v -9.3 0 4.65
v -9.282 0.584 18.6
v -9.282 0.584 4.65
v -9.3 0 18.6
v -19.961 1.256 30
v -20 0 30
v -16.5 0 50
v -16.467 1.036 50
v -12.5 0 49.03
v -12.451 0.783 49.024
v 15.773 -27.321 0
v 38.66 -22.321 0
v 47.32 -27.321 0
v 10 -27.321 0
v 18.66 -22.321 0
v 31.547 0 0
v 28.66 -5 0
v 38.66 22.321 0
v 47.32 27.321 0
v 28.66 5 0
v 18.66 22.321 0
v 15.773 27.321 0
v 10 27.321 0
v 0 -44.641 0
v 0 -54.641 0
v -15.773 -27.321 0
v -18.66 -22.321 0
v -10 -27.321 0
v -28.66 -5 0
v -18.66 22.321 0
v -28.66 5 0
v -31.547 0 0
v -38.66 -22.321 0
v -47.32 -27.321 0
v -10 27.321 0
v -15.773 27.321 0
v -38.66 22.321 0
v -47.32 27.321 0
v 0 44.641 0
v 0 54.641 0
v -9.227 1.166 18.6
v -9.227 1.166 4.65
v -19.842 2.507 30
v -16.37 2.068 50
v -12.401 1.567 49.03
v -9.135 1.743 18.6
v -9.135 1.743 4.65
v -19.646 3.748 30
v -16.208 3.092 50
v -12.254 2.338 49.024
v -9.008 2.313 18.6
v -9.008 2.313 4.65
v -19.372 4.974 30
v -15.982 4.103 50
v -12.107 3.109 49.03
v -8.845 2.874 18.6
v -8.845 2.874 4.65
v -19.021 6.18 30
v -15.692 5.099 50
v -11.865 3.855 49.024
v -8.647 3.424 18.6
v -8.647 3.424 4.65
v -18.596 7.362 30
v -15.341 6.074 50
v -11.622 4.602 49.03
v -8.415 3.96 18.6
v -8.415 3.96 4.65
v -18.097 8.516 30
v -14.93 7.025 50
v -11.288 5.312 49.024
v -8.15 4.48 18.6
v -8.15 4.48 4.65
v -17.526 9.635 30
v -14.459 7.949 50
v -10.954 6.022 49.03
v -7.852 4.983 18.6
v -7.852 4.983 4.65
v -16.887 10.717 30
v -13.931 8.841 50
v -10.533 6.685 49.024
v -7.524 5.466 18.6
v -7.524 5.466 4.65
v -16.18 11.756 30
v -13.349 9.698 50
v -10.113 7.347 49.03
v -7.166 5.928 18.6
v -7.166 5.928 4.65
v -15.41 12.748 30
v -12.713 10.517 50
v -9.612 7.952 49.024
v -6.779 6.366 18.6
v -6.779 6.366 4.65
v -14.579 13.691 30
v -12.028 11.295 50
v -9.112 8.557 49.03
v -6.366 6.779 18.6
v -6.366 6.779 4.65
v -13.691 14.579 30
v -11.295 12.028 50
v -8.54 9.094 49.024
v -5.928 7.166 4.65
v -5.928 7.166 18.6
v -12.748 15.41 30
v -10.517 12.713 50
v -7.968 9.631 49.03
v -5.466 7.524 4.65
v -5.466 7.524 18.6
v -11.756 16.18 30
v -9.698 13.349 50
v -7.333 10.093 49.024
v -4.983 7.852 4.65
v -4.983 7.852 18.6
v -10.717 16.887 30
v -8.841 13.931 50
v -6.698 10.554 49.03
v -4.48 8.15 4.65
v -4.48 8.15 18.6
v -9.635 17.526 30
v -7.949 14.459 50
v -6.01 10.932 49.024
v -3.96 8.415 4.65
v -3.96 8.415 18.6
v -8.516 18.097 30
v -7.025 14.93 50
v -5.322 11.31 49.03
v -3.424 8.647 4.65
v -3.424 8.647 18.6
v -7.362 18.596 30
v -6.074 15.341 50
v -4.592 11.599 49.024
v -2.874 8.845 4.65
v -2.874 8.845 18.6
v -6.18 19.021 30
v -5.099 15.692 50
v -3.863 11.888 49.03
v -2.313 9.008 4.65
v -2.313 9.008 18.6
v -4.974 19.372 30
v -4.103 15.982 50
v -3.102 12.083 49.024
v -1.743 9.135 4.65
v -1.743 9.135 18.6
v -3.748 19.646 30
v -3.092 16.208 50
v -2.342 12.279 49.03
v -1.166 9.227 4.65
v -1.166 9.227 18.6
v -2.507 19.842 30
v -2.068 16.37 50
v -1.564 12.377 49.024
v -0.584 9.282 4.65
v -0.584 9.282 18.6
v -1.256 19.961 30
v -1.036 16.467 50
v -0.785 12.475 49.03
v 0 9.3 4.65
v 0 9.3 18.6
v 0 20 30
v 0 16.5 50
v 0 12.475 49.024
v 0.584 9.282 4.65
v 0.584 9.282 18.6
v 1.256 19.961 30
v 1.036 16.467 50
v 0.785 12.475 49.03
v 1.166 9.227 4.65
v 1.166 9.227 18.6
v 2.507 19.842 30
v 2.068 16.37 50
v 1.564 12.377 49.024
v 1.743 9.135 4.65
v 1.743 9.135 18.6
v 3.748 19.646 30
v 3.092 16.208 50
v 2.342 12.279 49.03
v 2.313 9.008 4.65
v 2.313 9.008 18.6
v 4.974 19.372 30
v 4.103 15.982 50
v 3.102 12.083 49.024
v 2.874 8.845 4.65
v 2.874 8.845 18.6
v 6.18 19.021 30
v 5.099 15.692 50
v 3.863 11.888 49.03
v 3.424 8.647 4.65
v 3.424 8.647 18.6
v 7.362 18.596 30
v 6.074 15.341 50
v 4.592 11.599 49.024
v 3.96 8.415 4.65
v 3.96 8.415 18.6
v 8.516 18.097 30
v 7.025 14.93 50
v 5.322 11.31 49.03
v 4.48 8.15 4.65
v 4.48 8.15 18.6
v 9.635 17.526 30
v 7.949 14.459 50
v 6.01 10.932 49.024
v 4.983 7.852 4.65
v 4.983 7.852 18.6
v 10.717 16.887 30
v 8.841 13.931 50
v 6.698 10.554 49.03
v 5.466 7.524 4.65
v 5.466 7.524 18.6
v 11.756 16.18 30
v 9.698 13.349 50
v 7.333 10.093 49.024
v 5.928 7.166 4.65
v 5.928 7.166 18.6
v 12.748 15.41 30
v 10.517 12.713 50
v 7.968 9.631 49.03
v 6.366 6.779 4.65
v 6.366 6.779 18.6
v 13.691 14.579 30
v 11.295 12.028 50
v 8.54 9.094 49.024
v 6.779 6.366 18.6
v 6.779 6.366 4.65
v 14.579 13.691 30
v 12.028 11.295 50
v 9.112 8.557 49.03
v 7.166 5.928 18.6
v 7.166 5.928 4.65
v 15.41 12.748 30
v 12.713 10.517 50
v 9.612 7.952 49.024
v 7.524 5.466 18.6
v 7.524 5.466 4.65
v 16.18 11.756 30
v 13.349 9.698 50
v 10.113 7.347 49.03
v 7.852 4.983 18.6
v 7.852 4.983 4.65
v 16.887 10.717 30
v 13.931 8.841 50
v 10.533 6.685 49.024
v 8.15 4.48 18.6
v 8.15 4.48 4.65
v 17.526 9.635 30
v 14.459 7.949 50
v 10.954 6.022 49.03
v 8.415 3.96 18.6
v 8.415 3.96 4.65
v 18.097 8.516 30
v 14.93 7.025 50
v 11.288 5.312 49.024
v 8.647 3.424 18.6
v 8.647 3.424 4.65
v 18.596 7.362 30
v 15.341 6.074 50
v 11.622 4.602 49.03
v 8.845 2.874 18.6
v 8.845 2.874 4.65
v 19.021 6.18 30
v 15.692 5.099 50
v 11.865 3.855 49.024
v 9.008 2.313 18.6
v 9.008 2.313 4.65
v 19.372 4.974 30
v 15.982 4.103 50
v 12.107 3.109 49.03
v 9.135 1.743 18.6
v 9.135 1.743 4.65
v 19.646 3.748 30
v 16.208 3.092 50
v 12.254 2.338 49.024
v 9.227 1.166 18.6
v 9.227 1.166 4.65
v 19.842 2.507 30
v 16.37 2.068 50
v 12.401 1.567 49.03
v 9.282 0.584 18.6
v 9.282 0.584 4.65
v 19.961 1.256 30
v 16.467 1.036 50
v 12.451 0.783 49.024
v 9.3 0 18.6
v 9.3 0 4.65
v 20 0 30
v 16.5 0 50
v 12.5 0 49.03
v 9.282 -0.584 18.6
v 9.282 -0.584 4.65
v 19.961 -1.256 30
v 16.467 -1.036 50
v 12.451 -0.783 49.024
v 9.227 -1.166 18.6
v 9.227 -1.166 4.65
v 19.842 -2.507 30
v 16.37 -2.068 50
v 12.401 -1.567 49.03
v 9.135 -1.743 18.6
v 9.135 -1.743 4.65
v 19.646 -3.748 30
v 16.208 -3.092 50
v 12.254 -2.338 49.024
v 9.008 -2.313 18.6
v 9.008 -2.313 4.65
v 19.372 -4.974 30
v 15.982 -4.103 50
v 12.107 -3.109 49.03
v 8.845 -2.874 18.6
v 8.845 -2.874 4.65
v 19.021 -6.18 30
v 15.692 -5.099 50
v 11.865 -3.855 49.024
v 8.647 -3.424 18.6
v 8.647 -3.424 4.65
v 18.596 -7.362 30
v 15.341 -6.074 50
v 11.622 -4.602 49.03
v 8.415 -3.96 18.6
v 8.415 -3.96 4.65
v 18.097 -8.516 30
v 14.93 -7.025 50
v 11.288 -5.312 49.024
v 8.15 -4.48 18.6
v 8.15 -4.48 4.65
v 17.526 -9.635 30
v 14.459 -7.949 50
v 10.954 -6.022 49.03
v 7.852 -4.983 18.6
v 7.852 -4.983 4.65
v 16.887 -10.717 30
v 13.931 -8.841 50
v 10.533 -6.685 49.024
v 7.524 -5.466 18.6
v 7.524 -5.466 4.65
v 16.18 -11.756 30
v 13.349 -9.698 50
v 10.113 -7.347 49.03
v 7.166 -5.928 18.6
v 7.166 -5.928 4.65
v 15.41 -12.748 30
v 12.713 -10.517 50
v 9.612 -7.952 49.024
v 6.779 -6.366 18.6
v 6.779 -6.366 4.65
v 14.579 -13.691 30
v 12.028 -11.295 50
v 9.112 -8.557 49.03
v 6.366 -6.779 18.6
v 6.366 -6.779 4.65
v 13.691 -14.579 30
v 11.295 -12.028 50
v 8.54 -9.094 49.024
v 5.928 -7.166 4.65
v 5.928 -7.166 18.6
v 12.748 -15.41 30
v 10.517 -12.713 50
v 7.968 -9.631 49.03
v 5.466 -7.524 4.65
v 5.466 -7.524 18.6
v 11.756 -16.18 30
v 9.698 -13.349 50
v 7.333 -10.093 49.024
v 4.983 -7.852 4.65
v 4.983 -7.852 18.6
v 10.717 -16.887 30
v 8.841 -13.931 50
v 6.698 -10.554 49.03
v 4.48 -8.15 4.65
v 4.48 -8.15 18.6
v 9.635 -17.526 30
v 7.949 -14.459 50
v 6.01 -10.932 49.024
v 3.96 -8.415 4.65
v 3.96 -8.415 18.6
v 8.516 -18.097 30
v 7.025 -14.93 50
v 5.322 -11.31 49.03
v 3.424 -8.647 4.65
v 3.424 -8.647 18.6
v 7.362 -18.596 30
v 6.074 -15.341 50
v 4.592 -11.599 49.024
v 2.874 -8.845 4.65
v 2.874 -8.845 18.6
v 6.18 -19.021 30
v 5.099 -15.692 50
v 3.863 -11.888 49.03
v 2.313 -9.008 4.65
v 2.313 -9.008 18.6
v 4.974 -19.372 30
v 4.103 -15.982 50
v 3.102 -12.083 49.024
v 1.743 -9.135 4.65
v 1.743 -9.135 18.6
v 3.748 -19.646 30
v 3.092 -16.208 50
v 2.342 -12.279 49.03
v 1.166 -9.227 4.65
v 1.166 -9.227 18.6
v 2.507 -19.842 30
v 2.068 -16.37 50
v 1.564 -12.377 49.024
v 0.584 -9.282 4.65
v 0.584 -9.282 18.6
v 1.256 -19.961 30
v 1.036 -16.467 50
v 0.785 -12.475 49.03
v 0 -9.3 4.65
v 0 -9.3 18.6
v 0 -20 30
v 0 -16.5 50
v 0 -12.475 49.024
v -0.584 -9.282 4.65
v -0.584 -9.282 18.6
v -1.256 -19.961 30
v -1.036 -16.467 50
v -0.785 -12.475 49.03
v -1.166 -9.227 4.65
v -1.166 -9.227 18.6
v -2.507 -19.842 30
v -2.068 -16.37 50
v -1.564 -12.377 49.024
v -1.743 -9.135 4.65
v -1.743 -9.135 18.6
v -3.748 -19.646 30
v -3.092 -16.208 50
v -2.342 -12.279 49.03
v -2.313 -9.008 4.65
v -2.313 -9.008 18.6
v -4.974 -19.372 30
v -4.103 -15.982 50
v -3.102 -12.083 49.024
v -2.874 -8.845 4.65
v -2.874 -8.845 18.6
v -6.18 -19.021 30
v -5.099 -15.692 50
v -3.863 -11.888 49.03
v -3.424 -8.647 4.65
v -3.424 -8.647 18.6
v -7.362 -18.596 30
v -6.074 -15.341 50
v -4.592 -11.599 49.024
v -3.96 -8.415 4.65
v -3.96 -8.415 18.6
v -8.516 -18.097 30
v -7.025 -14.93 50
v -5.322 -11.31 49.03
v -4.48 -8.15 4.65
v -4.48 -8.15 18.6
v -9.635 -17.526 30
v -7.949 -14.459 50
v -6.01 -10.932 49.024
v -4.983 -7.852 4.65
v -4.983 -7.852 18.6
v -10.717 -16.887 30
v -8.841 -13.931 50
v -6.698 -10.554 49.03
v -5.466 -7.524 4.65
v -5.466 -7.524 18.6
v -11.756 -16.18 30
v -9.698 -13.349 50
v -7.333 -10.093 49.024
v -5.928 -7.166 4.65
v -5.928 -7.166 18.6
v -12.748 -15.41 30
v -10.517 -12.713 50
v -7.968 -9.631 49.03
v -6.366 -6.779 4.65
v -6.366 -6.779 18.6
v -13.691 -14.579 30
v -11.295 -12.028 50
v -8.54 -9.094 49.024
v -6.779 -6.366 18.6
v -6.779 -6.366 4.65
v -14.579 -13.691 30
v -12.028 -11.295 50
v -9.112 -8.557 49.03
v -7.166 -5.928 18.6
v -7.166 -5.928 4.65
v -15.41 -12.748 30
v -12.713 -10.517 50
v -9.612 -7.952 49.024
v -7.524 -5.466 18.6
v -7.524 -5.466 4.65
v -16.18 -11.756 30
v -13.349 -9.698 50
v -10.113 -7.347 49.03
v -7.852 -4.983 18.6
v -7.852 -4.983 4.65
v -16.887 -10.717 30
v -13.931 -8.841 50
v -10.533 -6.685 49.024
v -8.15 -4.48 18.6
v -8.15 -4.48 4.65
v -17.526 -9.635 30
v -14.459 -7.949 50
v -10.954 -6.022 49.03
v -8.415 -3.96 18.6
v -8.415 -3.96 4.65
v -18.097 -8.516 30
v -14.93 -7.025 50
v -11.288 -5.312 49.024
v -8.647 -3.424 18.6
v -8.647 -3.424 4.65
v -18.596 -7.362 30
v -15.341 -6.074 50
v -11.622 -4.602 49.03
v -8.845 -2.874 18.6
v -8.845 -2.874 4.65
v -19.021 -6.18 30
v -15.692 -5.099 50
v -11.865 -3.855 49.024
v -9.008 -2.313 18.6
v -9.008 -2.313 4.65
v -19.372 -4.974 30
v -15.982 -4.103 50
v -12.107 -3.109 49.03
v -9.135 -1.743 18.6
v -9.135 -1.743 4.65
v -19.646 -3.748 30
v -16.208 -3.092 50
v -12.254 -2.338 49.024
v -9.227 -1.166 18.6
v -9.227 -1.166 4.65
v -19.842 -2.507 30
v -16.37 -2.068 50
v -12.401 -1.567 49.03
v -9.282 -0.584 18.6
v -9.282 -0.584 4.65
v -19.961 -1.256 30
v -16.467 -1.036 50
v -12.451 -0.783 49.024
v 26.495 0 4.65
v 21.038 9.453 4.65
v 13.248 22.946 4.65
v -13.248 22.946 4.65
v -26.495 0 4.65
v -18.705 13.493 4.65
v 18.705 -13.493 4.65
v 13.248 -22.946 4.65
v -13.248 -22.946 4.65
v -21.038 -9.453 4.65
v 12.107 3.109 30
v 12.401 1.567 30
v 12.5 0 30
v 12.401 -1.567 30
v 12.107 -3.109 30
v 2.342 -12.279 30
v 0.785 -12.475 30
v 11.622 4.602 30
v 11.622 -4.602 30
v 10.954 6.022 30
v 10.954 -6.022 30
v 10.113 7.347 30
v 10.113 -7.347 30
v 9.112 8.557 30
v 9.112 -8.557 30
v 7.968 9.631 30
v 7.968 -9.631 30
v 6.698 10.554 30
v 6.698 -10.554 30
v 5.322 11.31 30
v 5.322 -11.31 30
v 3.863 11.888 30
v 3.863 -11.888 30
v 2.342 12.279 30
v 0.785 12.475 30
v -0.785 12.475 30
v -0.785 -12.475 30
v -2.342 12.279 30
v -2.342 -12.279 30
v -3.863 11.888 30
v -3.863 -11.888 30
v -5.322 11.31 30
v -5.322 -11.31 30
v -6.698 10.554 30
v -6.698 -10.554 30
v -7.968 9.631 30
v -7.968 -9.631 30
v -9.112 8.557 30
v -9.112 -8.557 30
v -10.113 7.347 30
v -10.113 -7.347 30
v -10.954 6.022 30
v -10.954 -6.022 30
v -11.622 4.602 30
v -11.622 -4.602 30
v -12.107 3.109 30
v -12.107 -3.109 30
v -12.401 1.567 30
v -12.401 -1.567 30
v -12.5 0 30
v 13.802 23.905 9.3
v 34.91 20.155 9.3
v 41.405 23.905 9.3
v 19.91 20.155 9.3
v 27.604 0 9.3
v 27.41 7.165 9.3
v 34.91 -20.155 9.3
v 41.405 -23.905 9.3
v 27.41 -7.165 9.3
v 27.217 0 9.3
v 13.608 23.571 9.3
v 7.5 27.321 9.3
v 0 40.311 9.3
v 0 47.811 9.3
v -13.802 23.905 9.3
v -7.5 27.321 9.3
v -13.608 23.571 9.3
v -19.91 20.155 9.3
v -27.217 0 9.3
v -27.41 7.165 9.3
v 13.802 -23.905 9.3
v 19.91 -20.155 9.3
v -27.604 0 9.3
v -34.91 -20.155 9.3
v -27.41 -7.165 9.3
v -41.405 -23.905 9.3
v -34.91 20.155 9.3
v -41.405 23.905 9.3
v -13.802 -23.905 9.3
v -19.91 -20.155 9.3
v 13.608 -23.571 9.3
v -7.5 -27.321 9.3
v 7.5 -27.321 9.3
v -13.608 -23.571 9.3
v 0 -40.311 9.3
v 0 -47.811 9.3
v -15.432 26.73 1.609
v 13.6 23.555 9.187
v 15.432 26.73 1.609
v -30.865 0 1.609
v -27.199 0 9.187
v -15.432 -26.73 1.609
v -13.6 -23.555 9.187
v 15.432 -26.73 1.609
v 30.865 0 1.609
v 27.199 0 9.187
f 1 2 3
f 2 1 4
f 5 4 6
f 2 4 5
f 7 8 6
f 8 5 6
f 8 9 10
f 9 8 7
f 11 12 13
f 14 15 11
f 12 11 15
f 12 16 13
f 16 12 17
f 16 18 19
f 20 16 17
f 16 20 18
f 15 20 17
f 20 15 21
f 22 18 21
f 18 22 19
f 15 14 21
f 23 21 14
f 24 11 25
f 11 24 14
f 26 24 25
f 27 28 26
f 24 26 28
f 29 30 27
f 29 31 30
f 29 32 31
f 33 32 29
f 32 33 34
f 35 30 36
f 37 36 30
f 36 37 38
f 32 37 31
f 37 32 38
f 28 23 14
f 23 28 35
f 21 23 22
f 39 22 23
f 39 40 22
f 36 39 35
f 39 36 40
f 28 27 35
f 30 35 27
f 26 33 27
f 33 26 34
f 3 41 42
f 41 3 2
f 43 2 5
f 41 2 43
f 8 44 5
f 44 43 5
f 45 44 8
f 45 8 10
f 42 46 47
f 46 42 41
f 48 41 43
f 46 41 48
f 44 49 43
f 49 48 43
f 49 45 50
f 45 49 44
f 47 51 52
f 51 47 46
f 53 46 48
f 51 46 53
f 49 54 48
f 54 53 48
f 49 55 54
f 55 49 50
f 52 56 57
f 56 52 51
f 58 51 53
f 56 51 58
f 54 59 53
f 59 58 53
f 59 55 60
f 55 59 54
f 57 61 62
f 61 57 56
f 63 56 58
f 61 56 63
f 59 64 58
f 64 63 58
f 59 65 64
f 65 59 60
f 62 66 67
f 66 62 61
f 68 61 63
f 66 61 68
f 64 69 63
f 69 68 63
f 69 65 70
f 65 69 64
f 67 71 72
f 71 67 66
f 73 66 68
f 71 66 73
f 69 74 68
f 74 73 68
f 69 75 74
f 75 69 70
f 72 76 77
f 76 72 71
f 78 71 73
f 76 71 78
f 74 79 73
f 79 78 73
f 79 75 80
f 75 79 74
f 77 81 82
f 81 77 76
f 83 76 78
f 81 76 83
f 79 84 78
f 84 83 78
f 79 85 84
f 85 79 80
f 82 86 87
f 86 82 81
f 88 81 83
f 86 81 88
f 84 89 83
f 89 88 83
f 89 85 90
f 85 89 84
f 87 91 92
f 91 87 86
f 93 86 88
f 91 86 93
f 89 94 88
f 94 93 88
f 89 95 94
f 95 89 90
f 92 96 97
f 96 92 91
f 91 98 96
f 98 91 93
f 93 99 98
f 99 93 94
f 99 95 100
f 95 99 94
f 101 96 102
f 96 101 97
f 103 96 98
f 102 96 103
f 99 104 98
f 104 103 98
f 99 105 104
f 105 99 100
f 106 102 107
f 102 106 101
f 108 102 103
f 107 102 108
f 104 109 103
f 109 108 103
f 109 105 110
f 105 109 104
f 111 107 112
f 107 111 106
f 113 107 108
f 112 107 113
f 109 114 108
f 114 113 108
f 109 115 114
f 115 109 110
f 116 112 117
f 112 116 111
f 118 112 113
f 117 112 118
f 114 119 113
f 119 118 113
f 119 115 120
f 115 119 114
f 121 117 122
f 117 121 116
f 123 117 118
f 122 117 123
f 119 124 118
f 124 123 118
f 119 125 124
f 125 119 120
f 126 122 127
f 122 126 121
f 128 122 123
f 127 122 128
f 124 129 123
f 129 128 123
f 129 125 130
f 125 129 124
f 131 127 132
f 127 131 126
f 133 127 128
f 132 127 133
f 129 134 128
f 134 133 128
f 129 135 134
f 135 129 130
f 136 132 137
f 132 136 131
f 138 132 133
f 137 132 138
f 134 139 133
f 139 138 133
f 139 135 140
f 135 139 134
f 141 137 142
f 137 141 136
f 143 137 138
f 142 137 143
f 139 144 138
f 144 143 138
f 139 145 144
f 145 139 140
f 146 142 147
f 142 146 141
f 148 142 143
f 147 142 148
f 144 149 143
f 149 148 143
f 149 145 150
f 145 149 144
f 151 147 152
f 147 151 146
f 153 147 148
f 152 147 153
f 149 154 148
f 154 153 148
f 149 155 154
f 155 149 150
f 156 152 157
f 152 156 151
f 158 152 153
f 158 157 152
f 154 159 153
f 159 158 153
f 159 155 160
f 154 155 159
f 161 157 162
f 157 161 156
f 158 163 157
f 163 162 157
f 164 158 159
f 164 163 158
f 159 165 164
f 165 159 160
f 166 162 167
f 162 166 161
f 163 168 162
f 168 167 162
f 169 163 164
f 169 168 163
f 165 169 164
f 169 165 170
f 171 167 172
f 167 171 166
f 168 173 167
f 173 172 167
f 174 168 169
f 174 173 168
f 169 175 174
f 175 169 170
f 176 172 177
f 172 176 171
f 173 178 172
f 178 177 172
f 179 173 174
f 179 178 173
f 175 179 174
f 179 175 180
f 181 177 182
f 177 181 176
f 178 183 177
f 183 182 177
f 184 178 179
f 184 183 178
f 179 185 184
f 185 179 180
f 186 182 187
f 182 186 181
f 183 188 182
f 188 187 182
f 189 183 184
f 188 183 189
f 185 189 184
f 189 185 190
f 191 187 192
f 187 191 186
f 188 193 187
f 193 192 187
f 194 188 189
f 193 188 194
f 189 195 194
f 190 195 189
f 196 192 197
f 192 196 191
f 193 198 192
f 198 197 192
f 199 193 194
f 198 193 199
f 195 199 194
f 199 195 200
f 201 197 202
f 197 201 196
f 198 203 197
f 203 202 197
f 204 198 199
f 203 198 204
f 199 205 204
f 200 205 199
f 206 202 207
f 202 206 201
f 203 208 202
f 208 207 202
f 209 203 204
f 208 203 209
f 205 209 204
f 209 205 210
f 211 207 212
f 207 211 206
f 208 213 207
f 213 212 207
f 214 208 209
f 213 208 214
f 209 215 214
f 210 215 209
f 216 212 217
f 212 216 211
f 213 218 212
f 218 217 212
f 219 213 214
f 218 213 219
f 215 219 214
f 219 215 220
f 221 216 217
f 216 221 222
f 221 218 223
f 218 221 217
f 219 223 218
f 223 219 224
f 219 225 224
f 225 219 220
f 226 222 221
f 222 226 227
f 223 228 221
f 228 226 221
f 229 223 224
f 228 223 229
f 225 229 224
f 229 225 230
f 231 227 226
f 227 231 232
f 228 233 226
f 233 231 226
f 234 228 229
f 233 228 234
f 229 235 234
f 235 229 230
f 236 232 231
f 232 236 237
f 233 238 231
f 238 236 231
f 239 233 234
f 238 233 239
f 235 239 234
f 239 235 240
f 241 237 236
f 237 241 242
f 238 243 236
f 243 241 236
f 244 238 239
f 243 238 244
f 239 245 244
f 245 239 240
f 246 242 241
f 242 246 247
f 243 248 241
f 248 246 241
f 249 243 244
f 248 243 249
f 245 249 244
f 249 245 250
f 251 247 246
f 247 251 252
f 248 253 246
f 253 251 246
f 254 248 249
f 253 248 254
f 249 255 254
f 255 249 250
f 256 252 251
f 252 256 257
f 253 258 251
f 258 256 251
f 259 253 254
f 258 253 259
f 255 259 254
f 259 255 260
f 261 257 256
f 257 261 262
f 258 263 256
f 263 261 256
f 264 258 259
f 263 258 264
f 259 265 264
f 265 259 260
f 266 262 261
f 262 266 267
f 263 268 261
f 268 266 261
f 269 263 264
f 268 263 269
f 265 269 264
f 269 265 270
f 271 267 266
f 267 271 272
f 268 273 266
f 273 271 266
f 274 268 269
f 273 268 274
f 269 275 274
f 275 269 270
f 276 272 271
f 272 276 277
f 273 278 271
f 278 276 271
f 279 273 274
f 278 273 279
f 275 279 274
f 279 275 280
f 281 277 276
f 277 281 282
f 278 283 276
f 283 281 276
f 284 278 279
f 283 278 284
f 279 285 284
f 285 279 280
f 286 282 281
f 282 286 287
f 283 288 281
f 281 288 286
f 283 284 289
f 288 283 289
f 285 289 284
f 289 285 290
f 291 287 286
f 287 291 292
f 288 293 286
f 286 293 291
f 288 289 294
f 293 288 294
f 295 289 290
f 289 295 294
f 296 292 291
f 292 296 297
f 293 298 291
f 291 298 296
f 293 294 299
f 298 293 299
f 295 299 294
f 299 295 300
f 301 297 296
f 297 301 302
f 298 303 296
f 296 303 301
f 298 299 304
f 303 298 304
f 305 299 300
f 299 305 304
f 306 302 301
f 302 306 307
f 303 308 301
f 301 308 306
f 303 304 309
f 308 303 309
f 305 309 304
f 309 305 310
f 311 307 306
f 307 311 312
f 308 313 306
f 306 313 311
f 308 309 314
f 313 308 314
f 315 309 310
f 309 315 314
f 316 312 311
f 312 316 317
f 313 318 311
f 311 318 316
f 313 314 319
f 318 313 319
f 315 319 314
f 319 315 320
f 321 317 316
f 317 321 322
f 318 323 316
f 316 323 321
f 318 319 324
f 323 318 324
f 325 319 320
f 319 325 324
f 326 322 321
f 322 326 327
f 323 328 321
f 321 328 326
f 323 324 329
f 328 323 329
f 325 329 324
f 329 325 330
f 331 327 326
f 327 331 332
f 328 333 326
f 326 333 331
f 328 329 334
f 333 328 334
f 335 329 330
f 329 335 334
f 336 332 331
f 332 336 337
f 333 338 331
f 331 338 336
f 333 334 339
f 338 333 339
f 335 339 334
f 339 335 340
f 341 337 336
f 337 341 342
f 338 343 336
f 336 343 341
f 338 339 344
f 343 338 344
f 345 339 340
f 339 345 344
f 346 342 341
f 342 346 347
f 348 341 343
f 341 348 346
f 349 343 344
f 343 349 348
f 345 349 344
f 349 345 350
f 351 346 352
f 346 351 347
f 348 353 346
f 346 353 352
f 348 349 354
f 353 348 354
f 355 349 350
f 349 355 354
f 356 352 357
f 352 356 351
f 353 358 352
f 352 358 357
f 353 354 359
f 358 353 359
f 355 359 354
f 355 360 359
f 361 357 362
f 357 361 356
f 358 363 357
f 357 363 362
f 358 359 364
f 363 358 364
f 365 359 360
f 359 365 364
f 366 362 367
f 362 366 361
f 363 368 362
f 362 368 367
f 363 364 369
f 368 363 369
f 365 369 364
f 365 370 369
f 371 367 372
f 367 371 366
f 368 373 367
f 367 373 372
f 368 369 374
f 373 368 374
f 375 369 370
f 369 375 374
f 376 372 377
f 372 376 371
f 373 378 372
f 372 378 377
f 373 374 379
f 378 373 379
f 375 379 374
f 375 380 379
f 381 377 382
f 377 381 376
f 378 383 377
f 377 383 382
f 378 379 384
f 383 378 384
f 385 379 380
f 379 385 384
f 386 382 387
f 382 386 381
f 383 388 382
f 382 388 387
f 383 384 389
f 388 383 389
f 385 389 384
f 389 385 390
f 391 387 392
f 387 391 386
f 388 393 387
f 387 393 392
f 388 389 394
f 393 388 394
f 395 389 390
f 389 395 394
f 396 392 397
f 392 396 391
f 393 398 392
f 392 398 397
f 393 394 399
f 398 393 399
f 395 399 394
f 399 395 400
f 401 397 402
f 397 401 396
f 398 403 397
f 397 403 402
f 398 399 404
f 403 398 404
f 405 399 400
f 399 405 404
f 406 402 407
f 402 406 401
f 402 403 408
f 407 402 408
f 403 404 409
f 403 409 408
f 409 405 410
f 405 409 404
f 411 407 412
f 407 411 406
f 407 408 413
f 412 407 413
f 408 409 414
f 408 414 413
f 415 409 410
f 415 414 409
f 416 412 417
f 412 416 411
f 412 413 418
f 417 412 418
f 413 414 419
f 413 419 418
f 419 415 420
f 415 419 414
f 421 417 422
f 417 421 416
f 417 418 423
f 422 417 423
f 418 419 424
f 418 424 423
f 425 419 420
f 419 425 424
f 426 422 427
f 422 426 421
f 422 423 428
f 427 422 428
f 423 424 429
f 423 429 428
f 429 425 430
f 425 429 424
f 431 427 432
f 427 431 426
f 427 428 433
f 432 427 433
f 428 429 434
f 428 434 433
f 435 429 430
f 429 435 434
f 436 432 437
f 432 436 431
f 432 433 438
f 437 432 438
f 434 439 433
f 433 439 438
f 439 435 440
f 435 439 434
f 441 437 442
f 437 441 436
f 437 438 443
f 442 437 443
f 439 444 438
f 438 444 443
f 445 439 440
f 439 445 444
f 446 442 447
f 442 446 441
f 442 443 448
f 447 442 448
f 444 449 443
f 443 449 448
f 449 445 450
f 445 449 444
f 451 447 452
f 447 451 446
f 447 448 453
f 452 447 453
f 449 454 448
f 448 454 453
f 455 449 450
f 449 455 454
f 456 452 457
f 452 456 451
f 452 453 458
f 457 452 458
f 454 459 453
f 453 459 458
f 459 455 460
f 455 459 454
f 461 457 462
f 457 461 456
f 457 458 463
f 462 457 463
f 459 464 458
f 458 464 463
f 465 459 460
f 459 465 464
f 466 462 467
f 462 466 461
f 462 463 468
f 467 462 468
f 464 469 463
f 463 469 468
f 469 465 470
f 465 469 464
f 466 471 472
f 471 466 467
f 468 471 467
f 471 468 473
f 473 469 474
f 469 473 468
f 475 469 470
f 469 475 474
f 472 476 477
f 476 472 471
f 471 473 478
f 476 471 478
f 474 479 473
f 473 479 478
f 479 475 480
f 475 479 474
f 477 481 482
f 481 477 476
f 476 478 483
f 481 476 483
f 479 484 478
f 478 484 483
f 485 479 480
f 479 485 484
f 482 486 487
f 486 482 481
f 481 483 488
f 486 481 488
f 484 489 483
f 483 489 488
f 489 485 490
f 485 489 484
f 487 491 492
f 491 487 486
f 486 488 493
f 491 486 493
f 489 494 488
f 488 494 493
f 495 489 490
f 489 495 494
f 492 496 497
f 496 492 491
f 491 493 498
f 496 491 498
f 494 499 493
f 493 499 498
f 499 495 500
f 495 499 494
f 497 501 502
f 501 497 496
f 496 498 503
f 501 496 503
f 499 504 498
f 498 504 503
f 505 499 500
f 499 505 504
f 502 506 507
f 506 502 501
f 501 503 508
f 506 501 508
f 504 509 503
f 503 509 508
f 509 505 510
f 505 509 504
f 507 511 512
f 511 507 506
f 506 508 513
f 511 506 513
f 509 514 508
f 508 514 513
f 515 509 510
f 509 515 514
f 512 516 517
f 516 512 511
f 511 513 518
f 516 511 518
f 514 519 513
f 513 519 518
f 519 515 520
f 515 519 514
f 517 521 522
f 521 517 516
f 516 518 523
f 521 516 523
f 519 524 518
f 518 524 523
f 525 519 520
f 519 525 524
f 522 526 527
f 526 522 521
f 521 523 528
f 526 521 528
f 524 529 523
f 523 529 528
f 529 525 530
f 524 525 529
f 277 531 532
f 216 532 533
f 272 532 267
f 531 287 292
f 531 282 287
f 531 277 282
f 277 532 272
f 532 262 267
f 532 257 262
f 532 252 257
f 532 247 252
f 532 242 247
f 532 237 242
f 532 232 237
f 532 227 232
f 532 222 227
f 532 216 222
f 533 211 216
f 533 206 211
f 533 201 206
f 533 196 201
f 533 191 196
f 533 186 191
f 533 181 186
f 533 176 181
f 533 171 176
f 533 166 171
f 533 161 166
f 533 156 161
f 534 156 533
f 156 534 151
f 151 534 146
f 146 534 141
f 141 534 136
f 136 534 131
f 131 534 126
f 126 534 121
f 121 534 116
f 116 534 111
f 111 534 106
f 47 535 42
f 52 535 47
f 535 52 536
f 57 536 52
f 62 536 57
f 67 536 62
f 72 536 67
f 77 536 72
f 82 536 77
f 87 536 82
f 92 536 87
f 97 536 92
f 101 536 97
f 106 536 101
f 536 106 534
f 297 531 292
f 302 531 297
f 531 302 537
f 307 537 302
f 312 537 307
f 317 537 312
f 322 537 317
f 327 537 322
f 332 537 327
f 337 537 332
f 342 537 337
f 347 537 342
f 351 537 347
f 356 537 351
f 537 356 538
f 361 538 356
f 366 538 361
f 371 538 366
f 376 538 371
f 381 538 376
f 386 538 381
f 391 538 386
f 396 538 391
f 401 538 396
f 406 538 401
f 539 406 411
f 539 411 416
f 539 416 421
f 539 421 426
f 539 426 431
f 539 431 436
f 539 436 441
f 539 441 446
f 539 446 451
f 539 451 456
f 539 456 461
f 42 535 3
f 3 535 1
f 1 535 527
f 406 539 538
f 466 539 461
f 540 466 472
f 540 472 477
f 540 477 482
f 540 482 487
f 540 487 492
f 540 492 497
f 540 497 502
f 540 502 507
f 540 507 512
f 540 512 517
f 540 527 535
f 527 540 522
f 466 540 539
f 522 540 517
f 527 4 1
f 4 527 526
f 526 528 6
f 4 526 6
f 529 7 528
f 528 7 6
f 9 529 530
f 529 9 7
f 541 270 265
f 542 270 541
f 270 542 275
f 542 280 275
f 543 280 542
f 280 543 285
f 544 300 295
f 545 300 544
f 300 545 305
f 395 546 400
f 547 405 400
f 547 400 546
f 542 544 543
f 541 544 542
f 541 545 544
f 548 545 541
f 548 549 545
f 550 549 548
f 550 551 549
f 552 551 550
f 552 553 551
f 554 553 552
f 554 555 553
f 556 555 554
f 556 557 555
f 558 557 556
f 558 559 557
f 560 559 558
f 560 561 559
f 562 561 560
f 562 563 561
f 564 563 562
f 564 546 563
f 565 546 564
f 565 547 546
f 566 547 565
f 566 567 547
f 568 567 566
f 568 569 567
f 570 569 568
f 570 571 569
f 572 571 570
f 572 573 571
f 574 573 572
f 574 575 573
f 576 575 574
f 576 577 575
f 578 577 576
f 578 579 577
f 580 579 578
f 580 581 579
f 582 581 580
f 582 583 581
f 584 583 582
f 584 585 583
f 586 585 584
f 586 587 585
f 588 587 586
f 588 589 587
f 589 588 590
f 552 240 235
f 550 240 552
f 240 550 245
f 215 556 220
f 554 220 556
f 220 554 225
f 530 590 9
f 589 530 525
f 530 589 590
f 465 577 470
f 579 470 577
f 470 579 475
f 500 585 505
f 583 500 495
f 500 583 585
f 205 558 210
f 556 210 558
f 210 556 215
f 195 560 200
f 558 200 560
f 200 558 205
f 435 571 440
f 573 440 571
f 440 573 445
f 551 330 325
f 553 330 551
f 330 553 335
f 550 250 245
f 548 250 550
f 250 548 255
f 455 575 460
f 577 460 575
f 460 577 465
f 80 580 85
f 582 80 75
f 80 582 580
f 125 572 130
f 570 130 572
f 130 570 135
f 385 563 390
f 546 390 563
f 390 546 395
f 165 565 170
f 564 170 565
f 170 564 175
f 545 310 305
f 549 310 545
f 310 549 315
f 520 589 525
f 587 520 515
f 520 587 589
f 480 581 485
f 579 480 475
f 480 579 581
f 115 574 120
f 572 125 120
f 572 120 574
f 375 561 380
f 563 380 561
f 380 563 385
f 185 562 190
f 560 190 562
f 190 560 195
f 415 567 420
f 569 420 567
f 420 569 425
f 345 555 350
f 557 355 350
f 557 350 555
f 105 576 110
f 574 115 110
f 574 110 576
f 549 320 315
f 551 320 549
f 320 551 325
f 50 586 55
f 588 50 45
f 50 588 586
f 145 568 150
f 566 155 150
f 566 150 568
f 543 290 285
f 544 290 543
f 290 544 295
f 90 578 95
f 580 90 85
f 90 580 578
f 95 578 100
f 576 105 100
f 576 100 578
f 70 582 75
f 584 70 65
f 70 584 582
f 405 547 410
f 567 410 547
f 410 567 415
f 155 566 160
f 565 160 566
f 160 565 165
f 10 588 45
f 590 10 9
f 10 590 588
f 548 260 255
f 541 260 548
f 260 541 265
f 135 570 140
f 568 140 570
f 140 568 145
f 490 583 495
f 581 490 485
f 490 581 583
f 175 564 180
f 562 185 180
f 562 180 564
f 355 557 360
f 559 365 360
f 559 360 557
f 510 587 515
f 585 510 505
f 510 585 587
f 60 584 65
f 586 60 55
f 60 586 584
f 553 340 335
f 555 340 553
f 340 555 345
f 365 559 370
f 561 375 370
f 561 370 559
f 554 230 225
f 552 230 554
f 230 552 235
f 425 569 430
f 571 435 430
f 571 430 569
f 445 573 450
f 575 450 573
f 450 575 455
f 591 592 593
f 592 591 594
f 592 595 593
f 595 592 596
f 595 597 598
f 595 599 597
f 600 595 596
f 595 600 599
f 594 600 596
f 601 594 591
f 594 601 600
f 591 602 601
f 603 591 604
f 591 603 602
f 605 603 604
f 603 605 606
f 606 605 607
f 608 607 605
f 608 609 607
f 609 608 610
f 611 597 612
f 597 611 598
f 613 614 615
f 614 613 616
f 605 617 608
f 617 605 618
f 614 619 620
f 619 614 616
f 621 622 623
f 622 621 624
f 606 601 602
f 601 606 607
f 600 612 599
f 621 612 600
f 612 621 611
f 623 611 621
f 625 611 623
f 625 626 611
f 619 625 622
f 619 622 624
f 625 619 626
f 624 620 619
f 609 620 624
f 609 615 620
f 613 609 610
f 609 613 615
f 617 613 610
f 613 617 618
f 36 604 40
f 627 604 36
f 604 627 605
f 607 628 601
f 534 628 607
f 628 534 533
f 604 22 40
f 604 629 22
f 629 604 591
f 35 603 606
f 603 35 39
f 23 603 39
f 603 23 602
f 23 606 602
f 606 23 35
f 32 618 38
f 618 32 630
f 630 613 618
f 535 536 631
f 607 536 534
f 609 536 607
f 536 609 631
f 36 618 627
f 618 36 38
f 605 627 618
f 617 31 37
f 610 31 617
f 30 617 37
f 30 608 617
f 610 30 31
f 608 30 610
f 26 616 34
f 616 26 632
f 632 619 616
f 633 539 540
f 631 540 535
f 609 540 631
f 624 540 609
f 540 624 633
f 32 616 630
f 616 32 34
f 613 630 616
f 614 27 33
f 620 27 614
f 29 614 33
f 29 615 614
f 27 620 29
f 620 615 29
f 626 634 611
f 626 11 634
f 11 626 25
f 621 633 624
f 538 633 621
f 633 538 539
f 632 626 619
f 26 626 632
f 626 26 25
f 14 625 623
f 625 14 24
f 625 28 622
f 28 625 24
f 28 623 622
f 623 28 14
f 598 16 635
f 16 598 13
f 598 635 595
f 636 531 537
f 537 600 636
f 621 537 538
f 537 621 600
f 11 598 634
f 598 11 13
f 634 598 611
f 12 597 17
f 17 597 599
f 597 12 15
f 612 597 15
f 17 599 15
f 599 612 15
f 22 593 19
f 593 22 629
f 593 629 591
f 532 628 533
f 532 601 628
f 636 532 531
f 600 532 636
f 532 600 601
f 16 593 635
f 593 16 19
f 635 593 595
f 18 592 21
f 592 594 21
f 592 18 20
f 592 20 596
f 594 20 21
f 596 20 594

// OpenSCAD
/*          
            Shabbat Candle Holder
            Steve Medwin
            April 2015
*/
$fn=100*1.0;  
// preview[view:north east, tilt:top diagonal]

// user parameters
// height (mm) =
Top = 50;    // [40:70]
// height (mm) =
Middle = 30;    // [20:40]
// at middle (mm) =
Width = 40;     // [30:80]
// side (mm) =
Star = 20;      // [10:30]
// in star
Taper = 3;   // [1:4]
// diameter (mm) =
Candle = 25.0;  // [9:30] 

// other parameters
// star of david
s = Star; 
t = 5*1.0; 
h = tan(60)*s/2;
h1 = t/sin(30);
h2 = h + t*2;
ztaper = Taper/4;

// polygon profile that is rotated
Xr = Candle/2;
Xa = h2; 
Yb = 9.3*1.0;
Xc = 9.3*1.0;
Yd = 18.6*1.0;
Xe = Width/2;
Ye = Middle;
Xf = Xr + 4;
Yf = Top;
Yg = Yf - 4;

difference() {
    rotate_extrude(convexity=10)
    polygon( points=[[0,0],[Xa,0],[Xa,Yb/2],[Xc,Yb/2],[Xc,Yd],[Xe,Ye],[Xf,Yf],[0,Yg]]); 
    translate([0,0,Ye]) cylinder(h = Yf, r=Xr, $fn=50);     // subtract cylinder for candle
}

for (i=[0:5]) {
   rotate([0,0,60*i])   translate([0,h2,0]) 
   linear_extrude(height = Yb, center = false, convexity = 10, twist = 0, scale = ztaper) 
   polygon(points=[[s/2,0],[0,h],[-s/2,0],[s/2+h1*cos(30),-t],[0,h+h1],[-s/2-h1*cos(30),-t]], paths=[[0,1,2],[3,4,5]]);
   }
       
